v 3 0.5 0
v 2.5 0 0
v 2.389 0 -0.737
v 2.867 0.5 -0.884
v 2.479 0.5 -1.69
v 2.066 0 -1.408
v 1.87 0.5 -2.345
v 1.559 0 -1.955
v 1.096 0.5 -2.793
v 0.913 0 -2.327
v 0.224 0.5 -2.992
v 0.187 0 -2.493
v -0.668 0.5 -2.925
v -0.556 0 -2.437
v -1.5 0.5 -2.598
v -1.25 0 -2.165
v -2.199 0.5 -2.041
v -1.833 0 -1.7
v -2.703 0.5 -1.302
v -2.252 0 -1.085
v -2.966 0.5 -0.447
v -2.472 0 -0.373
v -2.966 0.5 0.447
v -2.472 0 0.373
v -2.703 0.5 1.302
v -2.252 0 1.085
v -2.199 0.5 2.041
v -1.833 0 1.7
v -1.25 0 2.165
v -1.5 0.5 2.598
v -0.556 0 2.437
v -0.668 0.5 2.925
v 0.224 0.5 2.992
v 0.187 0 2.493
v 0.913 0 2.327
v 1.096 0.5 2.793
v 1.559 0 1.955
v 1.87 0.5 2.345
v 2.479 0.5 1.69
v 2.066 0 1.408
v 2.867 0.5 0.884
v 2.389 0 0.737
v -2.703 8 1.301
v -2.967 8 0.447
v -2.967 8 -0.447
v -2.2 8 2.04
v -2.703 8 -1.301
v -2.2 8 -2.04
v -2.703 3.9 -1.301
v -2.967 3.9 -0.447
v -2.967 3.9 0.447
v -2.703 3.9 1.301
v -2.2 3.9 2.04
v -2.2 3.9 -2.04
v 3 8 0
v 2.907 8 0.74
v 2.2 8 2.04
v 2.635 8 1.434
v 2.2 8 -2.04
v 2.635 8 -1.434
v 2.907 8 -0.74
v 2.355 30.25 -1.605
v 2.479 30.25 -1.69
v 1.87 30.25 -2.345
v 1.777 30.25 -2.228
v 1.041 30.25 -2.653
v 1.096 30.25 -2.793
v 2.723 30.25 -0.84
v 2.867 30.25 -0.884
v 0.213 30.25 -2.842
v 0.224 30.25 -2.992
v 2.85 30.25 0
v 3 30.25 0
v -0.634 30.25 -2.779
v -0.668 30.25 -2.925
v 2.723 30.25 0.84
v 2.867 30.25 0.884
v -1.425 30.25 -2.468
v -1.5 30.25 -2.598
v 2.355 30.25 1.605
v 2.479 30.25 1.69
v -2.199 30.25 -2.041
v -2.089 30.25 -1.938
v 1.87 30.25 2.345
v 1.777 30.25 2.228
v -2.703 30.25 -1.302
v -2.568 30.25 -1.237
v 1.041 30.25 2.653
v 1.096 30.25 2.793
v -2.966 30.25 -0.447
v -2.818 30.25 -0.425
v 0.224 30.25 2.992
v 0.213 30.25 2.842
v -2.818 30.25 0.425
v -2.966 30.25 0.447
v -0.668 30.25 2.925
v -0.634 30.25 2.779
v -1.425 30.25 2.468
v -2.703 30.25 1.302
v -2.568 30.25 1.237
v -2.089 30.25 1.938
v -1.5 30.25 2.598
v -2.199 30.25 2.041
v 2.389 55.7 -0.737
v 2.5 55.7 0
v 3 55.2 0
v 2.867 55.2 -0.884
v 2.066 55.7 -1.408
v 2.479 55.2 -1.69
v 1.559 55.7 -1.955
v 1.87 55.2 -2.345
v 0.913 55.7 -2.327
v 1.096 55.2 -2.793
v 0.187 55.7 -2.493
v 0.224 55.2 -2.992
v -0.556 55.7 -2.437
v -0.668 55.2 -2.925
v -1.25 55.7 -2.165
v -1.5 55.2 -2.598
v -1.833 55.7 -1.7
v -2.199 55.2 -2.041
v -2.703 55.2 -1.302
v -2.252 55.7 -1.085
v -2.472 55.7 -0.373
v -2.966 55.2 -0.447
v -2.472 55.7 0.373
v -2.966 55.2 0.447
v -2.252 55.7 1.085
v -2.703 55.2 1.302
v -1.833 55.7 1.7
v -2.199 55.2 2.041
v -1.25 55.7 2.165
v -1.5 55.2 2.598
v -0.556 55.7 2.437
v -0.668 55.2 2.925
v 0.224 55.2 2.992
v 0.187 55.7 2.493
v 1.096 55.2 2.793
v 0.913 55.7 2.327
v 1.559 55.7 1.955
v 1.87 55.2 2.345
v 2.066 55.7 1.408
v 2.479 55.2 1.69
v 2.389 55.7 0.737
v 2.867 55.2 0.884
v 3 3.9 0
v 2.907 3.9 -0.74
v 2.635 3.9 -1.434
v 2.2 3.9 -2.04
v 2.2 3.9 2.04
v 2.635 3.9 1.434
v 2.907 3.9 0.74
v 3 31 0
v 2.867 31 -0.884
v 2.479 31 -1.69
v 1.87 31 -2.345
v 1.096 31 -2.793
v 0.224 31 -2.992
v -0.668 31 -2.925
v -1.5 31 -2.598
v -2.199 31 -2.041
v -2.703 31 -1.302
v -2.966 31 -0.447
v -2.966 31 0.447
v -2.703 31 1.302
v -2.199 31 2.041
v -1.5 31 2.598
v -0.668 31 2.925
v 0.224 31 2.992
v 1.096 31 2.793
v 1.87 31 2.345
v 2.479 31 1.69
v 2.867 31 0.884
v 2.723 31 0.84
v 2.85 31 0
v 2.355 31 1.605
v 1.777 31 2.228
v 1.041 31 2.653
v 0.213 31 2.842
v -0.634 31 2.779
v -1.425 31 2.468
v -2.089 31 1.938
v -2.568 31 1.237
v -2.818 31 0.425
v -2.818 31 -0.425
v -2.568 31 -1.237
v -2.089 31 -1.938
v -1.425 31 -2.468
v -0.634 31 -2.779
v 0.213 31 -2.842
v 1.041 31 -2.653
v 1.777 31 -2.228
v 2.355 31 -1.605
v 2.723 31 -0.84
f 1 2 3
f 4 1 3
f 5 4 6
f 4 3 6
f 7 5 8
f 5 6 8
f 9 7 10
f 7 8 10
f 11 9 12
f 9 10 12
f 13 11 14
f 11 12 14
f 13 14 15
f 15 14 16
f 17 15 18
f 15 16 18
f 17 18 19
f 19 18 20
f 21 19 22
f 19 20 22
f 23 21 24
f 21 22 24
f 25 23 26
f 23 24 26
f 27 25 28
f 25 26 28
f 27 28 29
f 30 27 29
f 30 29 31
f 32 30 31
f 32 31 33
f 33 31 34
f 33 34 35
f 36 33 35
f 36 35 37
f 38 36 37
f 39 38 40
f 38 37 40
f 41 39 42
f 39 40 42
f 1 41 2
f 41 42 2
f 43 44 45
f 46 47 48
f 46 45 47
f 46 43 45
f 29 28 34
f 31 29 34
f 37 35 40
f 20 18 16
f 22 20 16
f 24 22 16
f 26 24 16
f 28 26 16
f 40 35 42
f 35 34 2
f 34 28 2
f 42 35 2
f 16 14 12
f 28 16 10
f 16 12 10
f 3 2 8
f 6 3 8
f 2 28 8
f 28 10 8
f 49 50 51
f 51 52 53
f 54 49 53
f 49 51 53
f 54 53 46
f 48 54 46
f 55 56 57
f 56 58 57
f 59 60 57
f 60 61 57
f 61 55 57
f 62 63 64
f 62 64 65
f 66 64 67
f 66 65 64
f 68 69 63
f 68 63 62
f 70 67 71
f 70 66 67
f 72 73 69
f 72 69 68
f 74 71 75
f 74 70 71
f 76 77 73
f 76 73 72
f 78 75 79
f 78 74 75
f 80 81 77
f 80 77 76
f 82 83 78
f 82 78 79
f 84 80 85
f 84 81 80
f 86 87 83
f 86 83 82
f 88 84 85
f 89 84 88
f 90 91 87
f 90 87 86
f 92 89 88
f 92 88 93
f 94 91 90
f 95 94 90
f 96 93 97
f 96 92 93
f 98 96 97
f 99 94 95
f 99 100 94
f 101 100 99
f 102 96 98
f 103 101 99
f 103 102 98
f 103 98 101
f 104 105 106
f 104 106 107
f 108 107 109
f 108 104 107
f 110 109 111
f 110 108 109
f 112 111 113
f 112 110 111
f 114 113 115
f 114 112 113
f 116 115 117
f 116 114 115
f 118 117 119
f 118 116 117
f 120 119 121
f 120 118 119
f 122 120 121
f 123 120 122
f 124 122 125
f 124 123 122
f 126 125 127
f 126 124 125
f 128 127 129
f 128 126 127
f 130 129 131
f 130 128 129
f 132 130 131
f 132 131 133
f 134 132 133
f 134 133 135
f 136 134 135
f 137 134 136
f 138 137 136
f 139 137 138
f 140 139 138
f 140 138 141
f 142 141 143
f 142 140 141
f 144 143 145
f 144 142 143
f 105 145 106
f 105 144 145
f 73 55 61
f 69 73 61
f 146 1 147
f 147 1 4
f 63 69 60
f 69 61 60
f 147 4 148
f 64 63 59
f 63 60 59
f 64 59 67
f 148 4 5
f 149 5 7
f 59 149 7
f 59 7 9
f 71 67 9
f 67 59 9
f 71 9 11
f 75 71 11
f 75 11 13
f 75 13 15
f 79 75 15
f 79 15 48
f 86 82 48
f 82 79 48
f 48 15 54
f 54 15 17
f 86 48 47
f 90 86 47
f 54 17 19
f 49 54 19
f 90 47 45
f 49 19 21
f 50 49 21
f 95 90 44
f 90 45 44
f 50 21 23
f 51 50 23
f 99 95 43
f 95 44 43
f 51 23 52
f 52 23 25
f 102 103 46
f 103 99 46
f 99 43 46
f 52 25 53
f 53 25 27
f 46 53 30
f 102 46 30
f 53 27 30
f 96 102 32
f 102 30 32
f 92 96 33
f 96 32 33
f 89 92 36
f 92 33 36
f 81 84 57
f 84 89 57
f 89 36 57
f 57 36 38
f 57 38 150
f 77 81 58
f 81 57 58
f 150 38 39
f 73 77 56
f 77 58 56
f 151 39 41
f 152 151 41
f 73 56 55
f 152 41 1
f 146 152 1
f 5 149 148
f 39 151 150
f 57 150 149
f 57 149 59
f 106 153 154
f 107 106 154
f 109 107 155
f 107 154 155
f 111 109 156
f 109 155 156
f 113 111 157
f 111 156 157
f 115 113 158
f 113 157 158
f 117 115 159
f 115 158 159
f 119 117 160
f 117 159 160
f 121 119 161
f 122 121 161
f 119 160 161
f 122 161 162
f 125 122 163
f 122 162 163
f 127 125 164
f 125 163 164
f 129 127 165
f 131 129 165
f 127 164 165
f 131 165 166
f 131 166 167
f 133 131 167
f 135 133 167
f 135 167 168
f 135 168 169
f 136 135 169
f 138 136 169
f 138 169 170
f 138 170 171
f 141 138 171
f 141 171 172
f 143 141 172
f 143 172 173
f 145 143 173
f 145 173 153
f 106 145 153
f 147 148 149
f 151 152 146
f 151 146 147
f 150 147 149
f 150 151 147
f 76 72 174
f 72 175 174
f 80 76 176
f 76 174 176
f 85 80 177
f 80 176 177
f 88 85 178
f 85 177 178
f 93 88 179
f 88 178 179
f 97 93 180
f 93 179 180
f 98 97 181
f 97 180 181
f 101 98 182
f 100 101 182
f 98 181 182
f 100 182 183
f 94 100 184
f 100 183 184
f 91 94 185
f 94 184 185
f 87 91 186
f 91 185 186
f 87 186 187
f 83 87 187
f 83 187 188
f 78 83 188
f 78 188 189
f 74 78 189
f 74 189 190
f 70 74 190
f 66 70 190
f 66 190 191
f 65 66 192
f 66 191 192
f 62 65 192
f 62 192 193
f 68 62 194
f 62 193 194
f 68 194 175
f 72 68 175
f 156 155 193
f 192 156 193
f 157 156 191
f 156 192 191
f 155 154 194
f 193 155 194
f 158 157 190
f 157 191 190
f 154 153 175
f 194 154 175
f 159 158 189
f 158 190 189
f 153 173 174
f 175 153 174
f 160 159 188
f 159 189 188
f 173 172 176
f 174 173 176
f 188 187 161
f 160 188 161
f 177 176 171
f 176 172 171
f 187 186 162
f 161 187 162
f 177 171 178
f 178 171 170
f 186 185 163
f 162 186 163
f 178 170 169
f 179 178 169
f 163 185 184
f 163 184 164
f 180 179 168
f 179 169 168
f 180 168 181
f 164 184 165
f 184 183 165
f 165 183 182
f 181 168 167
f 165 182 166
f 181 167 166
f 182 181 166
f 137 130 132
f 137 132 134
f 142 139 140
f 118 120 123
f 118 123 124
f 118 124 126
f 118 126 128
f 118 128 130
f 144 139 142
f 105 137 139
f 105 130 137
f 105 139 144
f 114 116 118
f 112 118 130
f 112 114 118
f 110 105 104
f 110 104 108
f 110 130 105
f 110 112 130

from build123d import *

# Parameters (mm, degrees)
SKETCH1_R           = 3
BOSS_EXTRUDE1_DEPTH = 55.7
SKETCH2_W           = 0.8
SKETCH2_H           = 4.1
CUT_EXTRUDE1_DEPTH  = 4
SKETCH3_W           = 0.15
SKETCH3_H           = 0.75
CHAMFER1_SIZE       = 0.5


with BuildPart() as part:
    # Sketch1 → Boss-Extrude1 (new body)
    with BuildSketch(Plane(origin=(0, 0, 0), x_dir=(1, 0, 0), z_dir=(0, 1, 0))):
        Circle(SKETCH1_R)
    extrude(amount=BOSS_EXTRUDE1_DEPTH)

    # Sketch2 → Cut-Extrude1 (cut, symmetric)
    with BuildSketch(Plane.XY):
        with Locations((-2.6, 5.95)):
            Rectangle(SKETCH2_W, SKETCH2_H)
    cut_extrude1 = extrude(amount=CUT_EXTRUDE1_DEPTH, both=True, mode=Mode.SUBTRACT)

    # Mirror1: Cut-Extrude1 across plane
    add(cut_extrude1.mirror(Plane(origin=(0, 0, 0), x_dir=(0, 0, 1), z_dir=(1, 0, 0))), mode=Mode.SUBTRACT)

    # Sketch3 → Cut-Revolve1 (revolve, cut)
    with BuildSketch(Plane.XY):
        with Locations((2.925, 30.625)):
            Rectangle(SKETCH3_W, SKETCH3_H)
    revolve(axis=Axis((0, 55.7, 0), (0, -1, 0)), mode=Mode.SUBTRACT)

    # Chamfer1
    chamfer1_edges = [part.edges().sort_by_distance(p)[0] for p in [
        (-3, 0, 0),
        (-3, 55.7, 0),
    ]]
    chamfer(chamfer1_edges, length=CHAMFER1_SIZE)


solid = part.part
